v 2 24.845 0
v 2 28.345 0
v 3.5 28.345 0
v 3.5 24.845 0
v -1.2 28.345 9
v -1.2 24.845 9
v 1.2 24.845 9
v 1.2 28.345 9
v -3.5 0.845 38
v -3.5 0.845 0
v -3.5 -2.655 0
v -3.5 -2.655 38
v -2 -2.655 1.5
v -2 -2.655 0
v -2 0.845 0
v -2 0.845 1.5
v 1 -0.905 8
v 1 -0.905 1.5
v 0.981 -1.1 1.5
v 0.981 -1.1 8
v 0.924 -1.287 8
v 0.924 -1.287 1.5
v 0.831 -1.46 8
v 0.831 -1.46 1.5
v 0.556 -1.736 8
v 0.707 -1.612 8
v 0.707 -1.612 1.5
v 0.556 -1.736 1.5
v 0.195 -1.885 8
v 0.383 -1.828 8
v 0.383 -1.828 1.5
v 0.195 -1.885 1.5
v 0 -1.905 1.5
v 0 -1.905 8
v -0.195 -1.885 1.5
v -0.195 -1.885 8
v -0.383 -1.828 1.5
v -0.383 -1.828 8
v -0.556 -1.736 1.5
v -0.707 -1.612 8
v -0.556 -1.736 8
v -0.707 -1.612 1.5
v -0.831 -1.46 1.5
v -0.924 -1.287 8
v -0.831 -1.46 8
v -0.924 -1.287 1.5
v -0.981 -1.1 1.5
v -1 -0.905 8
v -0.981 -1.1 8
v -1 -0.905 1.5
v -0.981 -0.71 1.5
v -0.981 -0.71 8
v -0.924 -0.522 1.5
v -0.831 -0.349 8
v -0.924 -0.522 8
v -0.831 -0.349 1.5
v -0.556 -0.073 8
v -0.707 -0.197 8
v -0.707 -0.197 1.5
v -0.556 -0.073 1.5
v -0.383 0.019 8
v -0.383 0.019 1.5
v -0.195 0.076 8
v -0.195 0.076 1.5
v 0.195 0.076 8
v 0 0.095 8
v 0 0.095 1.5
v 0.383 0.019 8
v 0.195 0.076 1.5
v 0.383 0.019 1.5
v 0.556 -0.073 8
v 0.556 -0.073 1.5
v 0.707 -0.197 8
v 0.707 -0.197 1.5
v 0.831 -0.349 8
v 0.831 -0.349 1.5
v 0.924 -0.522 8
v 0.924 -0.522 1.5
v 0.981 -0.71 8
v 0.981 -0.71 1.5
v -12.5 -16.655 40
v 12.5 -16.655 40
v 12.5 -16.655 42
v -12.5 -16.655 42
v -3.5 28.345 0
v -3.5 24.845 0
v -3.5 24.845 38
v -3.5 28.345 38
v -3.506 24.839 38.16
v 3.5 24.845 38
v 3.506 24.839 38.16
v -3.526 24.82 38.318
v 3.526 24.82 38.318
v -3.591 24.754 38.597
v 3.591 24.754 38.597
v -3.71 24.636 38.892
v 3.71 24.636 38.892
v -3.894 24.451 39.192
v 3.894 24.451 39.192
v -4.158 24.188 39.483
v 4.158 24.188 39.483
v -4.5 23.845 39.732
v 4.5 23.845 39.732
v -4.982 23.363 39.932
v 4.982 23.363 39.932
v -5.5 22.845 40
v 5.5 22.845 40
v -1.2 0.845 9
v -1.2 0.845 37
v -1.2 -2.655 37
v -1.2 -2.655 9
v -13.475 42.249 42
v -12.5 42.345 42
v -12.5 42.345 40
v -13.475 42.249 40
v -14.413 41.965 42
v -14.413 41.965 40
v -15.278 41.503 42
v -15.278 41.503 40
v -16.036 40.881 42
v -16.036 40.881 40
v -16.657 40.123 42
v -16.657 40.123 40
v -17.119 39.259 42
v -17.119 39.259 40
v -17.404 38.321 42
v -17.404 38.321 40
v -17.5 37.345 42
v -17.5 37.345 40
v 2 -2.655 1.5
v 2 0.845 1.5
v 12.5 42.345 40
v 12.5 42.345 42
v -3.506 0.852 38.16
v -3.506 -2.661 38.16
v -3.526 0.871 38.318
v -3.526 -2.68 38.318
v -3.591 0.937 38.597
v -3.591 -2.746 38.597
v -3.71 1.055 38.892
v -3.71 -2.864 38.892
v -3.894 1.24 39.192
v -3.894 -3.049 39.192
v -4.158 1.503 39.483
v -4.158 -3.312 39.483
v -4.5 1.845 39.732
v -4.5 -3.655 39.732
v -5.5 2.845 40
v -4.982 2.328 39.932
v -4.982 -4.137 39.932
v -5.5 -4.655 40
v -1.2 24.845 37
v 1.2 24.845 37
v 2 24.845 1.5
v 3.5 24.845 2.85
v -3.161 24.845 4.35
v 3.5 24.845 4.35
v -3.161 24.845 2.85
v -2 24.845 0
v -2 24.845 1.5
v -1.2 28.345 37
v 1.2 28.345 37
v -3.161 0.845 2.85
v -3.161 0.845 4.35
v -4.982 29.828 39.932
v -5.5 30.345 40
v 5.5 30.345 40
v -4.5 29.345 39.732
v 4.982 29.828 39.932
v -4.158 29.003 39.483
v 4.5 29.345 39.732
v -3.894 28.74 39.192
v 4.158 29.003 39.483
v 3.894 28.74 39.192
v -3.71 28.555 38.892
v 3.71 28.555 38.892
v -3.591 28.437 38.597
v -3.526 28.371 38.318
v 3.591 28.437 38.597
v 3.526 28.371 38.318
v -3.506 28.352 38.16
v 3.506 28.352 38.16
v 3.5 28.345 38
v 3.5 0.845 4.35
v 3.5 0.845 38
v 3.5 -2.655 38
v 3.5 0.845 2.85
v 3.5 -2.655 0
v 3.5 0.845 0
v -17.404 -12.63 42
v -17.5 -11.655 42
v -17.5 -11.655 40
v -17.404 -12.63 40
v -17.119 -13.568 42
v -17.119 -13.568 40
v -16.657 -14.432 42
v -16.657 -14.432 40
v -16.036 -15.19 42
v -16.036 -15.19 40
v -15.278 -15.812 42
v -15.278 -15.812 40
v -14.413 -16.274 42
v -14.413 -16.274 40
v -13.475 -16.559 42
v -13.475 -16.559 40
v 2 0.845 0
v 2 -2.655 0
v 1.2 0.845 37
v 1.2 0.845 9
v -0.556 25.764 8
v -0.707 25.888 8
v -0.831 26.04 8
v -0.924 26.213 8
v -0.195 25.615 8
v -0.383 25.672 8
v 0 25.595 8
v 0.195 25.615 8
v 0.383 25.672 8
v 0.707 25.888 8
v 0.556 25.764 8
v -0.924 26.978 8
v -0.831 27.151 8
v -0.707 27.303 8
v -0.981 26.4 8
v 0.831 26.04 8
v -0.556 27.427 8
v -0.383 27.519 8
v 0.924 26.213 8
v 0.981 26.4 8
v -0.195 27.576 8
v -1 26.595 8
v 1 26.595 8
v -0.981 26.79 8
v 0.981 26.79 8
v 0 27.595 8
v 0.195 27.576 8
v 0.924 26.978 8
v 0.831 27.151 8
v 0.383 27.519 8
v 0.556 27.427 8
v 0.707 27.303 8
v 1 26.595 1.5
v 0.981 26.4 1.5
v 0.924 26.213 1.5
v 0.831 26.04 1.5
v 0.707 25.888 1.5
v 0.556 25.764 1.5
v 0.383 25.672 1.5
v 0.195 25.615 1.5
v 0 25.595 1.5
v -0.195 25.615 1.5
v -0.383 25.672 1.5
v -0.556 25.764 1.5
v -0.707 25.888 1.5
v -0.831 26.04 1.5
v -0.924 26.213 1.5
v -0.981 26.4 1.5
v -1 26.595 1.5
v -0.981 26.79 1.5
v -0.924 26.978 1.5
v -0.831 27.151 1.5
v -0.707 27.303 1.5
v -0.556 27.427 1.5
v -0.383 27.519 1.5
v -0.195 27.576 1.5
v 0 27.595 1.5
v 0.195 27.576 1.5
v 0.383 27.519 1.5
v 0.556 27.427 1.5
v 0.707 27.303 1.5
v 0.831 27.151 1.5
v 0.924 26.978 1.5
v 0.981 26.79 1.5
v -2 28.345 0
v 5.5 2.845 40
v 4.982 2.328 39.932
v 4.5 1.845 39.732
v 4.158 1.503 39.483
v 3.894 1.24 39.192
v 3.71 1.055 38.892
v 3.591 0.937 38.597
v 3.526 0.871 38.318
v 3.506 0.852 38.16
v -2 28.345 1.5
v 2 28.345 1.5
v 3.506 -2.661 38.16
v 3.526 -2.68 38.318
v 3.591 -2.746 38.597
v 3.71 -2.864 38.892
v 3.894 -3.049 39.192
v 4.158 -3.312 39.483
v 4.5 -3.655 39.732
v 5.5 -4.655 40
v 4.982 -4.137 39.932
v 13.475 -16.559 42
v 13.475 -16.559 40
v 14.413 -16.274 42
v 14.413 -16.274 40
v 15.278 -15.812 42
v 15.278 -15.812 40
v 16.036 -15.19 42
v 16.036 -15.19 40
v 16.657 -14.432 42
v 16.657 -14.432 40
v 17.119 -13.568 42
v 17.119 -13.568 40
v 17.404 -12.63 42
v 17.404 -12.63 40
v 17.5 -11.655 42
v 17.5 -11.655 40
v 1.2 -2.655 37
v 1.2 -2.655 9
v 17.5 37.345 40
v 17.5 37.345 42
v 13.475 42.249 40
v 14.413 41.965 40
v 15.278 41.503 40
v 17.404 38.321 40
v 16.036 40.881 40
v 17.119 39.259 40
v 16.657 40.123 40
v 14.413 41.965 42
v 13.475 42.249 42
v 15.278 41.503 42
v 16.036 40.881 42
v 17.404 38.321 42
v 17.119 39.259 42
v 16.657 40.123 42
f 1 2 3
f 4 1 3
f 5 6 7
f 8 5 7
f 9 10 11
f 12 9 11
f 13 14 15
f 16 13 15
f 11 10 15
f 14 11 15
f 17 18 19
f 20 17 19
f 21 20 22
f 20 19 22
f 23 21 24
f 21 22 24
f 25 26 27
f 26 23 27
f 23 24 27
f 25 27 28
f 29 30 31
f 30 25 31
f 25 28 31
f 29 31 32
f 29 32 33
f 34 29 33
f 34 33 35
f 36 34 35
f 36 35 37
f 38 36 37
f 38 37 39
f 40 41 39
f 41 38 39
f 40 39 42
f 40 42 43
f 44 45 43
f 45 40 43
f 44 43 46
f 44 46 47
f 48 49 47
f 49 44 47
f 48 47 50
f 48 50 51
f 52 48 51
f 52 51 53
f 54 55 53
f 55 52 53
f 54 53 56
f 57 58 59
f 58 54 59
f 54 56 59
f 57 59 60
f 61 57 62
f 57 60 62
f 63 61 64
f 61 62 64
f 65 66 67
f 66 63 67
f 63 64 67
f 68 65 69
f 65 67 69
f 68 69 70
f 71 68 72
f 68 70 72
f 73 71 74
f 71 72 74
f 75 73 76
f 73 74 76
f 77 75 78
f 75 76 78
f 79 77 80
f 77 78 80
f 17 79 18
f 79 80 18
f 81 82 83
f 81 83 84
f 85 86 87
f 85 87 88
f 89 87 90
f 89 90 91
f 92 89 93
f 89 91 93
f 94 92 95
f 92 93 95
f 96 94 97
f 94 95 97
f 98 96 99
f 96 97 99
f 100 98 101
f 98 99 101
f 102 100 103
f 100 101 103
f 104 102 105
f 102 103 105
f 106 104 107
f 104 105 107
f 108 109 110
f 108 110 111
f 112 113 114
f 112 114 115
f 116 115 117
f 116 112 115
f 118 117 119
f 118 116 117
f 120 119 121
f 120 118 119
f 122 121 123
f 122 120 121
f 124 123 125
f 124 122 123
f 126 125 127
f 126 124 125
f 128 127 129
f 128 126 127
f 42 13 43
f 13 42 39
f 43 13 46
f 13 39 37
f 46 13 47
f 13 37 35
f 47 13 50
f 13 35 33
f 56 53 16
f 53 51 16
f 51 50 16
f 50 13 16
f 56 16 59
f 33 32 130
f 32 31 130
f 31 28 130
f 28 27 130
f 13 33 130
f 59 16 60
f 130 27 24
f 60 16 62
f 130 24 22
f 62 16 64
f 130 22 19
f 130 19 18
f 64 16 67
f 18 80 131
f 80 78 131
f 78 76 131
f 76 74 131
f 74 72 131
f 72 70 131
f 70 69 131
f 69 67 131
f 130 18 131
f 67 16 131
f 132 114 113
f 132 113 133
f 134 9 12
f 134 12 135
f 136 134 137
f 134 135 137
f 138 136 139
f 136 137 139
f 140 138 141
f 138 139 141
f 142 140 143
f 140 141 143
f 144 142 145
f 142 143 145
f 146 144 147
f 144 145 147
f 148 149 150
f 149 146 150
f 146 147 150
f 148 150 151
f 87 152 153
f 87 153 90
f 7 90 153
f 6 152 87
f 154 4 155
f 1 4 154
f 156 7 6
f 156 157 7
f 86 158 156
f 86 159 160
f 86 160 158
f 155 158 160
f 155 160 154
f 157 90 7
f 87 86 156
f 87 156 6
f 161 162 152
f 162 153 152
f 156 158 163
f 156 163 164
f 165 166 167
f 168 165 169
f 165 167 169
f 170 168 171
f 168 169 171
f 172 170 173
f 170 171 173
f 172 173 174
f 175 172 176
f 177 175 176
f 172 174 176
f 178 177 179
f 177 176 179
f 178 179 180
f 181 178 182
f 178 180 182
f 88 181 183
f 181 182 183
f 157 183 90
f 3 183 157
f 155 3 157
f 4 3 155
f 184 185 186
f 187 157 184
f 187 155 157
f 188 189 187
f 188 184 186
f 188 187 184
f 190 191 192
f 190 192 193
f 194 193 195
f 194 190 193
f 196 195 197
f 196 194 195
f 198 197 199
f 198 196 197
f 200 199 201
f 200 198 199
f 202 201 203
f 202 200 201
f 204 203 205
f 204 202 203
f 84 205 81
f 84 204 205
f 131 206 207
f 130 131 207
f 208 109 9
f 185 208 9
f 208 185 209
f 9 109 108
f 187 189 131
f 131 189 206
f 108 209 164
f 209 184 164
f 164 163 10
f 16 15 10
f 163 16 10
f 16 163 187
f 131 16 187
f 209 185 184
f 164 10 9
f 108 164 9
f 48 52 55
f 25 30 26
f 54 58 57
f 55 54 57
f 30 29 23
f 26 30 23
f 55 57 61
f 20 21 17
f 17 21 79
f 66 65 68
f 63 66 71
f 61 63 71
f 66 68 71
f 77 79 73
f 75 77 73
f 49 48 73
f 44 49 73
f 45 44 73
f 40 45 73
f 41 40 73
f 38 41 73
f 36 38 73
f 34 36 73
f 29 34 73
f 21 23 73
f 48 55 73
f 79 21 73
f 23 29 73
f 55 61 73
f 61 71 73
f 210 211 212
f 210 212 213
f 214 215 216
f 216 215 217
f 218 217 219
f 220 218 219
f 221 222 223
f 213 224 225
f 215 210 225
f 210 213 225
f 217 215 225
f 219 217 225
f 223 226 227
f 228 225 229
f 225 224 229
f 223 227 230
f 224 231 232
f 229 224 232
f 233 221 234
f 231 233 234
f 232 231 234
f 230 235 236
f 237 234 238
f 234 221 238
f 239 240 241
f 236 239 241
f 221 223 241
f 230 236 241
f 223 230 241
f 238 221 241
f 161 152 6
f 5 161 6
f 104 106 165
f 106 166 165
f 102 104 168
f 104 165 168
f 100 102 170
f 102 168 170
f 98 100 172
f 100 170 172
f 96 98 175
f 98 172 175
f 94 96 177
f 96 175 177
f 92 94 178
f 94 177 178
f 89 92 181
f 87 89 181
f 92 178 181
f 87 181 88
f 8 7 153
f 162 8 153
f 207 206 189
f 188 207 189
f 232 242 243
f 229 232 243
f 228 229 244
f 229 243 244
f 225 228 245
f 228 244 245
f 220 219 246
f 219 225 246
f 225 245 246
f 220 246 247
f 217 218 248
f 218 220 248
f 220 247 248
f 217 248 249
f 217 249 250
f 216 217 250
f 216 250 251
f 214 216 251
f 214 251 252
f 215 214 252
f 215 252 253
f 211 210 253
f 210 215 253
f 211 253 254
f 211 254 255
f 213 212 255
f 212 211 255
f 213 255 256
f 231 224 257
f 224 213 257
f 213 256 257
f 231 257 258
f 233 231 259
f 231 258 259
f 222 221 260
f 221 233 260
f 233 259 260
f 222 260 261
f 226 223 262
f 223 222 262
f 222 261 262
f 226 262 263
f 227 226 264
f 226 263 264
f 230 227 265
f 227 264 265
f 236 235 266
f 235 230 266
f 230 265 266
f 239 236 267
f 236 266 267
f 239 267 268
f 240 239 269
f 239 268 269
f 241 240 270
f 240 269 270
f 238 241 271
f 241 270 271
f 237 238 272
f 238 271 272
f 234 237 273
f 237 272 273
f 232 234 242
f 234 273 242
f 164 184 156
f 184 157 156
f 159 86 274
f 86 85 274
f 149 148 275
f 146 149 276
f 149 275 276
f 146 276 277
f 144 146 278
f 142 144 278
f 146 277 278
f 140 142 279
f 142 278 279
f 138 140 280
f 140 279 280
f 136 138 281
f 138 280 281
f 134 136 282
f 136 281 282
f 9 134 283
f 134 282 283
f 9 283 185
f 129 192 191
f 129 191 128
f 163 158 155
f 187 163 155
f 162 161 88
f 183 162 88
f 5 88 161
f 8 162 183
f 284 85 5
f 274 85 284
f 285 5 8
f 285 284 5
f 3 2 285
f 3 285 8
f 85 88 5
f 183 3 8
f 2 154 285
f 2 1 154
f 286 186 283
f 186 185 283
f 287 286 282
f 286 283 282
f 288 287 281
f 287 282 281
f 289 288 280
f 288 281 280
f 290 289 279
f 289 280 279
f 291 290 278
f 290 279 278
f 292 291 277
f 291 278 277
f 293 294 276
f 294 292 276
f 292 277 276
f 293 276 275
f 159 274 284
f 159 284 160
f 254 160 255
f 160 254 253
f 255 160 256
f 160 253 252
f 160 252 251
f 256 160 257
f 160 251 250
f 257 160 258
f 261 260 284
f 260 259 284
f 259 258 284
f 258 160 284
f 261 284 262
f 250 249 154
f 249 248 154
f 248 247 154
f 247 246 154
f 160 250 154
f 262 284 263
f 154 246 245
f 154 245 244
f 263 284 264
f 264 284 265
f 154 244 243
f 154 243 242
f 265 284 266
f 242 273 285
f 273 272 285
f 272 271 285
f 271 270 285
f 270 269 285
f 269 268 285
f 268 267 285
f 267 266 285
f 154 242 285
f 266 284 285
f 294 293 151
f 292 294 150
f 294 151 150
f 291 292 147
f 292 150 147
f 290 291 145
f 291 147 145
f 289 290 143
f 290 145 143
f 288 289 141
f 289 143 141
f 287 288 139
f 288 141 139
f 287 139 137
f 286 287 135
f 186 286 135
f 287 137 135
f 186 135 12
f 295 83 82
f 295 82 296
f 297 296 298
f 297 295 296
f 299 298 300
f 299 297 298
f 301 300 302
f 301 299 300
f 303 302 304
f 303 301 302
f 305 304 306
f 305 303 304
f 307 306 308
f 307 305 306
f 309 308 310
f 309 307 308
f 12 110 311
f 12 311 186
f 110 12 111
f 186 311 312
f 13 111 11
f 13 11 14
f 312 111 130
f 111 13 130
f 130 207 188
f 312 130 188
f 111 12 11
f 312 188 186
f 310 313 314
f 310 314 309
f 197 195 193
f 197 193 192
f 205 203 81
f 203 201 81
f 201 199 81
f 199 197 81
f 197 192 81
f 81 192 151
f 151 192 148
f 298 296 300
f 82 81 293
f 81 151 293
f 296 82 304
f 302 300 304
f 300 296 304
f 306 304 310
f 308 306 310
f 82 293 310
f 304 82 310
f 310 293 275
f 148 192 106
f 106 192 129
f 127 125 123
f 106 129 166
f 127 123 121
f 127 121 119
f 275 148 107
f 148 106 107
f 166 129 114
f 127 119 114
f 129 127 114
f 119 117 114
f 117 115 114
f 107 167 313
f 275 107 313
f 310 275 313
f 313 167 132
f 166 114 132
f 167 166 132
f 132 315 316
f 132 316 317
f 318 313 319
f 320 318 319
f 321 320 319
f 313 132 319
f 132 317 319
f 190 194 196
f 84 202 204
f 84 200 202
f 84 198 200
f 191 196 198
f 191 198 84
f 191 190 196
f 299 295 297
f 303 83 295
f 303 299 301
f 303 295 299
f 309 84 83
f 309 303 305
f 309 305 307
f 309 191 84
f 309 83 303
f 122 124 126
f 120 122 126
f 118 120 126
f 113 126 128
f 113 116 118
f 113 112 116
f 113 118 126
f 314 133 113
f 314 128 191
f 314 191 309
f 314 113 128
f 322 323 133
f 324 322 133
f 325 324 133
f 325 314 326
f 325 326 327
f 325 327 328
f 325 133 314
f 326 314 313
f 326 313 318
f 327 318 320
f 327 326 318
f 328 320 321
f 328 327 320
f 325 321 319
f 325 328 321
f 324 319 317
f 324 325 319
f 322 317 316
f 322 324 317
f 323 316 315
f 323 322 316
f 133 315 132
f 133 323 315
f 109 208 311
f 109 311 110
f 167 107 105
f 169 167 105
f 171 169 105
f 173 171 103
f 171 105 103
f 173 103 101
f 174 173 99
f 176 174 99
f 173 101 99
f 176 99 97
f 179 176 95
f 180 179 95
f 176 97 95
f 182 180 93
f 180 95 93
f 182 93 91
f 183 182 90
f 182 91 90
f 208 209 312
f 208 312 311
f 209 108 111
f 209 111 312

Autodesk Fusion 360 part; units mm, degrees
sketch "Sketch1" plane through (0, 0, 0) normal (0, 0, 1) x (1, 0, 0)
  line L0 (-3.5, -2.6546) -> (3.5, -2.6546)
  line L1 (3.5, -2.6546) -> (3.5, 0.8454)
  line L2 (3.5, 0.8454) -> (-3.5, 0.8454)
  line L3 (-3.5, 0.8454) -> (-3.5, -2.6546)
  circle A0 centre (0, -0.9046) radius 1
  line L4 (-6.5474, 12.8454) -> (3.4526, 12.8454) construction
  line L5 (-3.5, 28.3454) -> (3.5, 28.3454)
  line L6 (-3.5, 24.8454) -> (-3.5, 28.3454)
  circle A1 centre (0, 26.5954) radius 1
  line L7 (3.5, 28.3454) -> (3.5, 24.8454)
  line L8 (3.5, 24.8454) -> (-3.5, 24.8454)
  line L9 (-2, 0.8454) -> (2, 0.8454)
  line L10 (2, 0.8454) -> (2, -2.6546)
  line L11 (2, -2.6546) -> (-2, -2.6546)
  line L12 (-2, -2.6546) -> (-2, 0.8454)
  line L13 (-2, 0.8454) -> (2, -2.6546) construction
  line L14 (2, 0.8454) -> (-2, -2.6546) construction
  line L15 (-2, 28.3454) -> (-2, 24.8454)
  line L16 (2, 24.8454) -> (2, 28.3454)
  line L17 (2, 28.3454) -> (-2, 28.3454)
  line L18 (-2, 24.8454) -> (2, 24.8454)
  point P0 (0, 0.8454)
  point P1 (3.5, -0.9046)
  point P2 (3.5, 26.5954)
  point P3 (0, 24.8454)
  point P4 (0, 25.6909)
  point P5 (0, -0.9046)
  dimension "d1" = 2
  dimension "d2" = 3.5
  dimension "d3" = 7
  dimension "d4" = 10
  dimension "d5" = 12
  dimension "d30" = 4
extrude "Extrude1" add sketch "Sketch1" along normal blind 40 contours L0 L2 L3 L12 | L0 L2 L9 L10 L11 L12 | L0 L1 L2 L10 | A0 | L5 L6 L8 L15 | L5 L8 L15 L16 L17 L18 | L5 L7 L8 L16 | A1 makes body 1 at (1.1667, 0.8454, 13.3333) makes body 2 at (-1.1667, 28.3454, 13.3333)
extrude "Extrude2" cut sketch "Sketch1" along normal blind 8 contours A0 | A1 bodies 1 2
sketch "Sketch2" plane through (0, 0.8454, 0) normal (0, 1, 0) x (-1, 0, 0)
  line L0 (-3.5, 0) -> (3.5, 0)
  line L1 (3.5, 0) -> (3.5, 40)
  line L2 (3.5, 40) -> (-3.5, 40)
  line L3 (-3.5, 40) -> (-3.5, 0)
  line L4 (-1.2, 37) -> (1.2, 37)
  line L5 (1.2, 37) -> (1.2, 9)
  line L6 (1.2, 9) -> (-1.2, 9)
  line L7 (-1.2, 9) -> (-1.2, 37)
  line L8 (3.5, 0) -> (-3.5, 0)
  dimension "d10" = 2.3
  dimension "d11" = 2.3
  dimension "d12" = 9
  dimension "d13" = 3
extrude "Extrude3" cut sketch "Sketch2" along normal through all and the other way through all contours L4 L5 L6 L7 bodies 2
sketch "Sketch3" plane through (0, 0, 0) normal (0, 0, 1) x (1, 0, 0)
  line L0 (17.5, -16.6546) -> (-17.5, -16.6546)
  line L1 (-17.5, -16.6546) -> (-17.5, 42.3454)
  line L2 (-17.5, 42.3454) -> (17.5, 42.3454)
  line L3 (17.5, 42.3454) -> (17.5, -16.6546)
  line L4 (-3.5, -2.6546) -> (3.5, -2.6546)
  line L5 (-3.5, 0.8454) -> (-3.5, -2.6546)
  line L6 (-3.5, 28.3454) -> (3.5, 28.3454)
  line L7 (-4, -16.6546) -> (4, -16.6546)
  line L8 (4, -16.6546) -> (4, -34.6546)
  line L9 (4, -34.6546) -> (-4, -34.6546)
  line L10 (-4, -34.6546) -> (-4, -16.6546)
  line L11 (-4, 42.3454) -> (4, 42.3454)
  line L12 (4, 42.3454) -> (4, 60.3454)
  line L13 (4, 60.3454) -> (-4, 60.3454)
  line L14 (-4, 60.3454) -> (-4, 42.3454)
  line L15 (17.5, 8.8454) -> (35.5, 8.8454)
  line L16 (35.5, 8.8454) -> (35.5, 16.8454)
  line L17 (35.5, 16.8454) -> (17.5, 16.8454)
  line L18 (17.5, 16.8454) -> (17.5, 8.8454)
  line L19 (-17.5, 8.8454) -> (-35.5, 8.8454)
  line L20 (-35.5, 8.8454) -> (-35.5, 16.8454)
  line L21 (-35.5, 16.8454) -> (-17.5, 16.8454)
  line L22 (-17.5, 16.8454) -> (-17.5, 8.8454)
  point P0 (3.5, -0.9046)
  point P1 (0, -34.6546)
  point P2 (-35.5, 12.8454)
  point P3 (35.5, 12.8454)
  point P4 (0, 60.3454)
  point P5 (-17.5, 12.8454)
  dimension "d15" = 14
  dimension "d16" = 14
  dimension "d17" = 14
  dimension "d18" = 14
  dimension "d43" = 8
  dimension "d44" = 18
extrude "Extrude4" add sketch "Sketch3" along normal blind 2 from surface at 40 contours L0 L1 L2 L3 L7 L11 L18 L22 bodies 1 2
fillet "Fillet1" radius 5 4 edges at (-17.5, -16.6546, 41) (-17.5, 42.3454, 41) (17.5, 42.3454, 41) (17.5, -16.6546, 41) on bodies 1
fillet "Fillet1" radius 2 8 edges at (0, 28.3454, 40) (-3.5, 26.5954, 40) (3.5, 26.5954, 40) (0, 24.8454, 40) (3.5, -0.9046, 40) (0, -2.6546, 40) (-3.5, -0.9046, 40) (0, 0.8454, 40) on bodies 1
extrude "Extrude5" cut sketch "Sketch2" against normal blind 8 contours L4 L5 L6 L7 bodies 1
extrude "Extrude6" cut sketch "Sketch1" along normal blind 1.5 contours L0 L2 L9 L10 L11 L12 | L5 L8 L15 L16 L17 L18 bodies 1
sketch "Sketch4" plane through (0, 24.8454, 0) normal (0, -1, 0) x (1, 0, 0)
  line L0 (-1.2, 9) -> (-1.2, 37)
  line L1 (-1.2, 37) -> (1.2, 37)
  line L2 (1.2, 37) -> (1.2, 9)
  line L3 (1.2, 9) -> (-1.2, 9)
  line L4 (-2, 0) -> (-2, 1.5)
  line L5 (-2, 1.5) -> (2, 1.5)
  line L6 (2, 1.5) -> (2, 0)
  line L7 (2, 0) -> (3.5, 0)
  line L8 (3.5, 0) -> (3.5, 38)
  line L9 (3.5, 38) -> (-3.5, 38)
  line L10 (-3.5, 38) -> (-3.5, 0)
  line L11 (-3.5, 0) -> (-2, 0)
  line L12 (3.5, 4.35) -> (-3.5, 4.35)
  line L13 (-3.5, 4.35) -> (-3.5, 2.85)
  line L14 (-3.5, 2.85) -> (3.5, 2.85)
  line L15 (3.5, 2.85) -> (3.5, 4.35)
  line L16 (-3.5, 2.85) -> (-3.1607, 2.85)
  line L17 (-3.1607, 2.85) -> (-3.1607, 4.35)
  line L18 (-3.1607, 4.35) -> (-3.5, 4.35)
  line L19 (-3.5, 4.35) -> (-3.5, 2.85)
  point P0 (3.5, 0)
  dimension "d40" = 1.5
  dimension "d42" = 2.85
extrude "Extrude7" add sketch "Sketch4" along normal up to surface (24 mm away) contours L8 L12 L14 L15 L17 bodies 1
equation "d11 = d10"
equation "d16 = d15"
equation "d17 = d16"
equation "d18 = d15"
equation "d34 = 1.5 mm"
equation "d40 = d34"
